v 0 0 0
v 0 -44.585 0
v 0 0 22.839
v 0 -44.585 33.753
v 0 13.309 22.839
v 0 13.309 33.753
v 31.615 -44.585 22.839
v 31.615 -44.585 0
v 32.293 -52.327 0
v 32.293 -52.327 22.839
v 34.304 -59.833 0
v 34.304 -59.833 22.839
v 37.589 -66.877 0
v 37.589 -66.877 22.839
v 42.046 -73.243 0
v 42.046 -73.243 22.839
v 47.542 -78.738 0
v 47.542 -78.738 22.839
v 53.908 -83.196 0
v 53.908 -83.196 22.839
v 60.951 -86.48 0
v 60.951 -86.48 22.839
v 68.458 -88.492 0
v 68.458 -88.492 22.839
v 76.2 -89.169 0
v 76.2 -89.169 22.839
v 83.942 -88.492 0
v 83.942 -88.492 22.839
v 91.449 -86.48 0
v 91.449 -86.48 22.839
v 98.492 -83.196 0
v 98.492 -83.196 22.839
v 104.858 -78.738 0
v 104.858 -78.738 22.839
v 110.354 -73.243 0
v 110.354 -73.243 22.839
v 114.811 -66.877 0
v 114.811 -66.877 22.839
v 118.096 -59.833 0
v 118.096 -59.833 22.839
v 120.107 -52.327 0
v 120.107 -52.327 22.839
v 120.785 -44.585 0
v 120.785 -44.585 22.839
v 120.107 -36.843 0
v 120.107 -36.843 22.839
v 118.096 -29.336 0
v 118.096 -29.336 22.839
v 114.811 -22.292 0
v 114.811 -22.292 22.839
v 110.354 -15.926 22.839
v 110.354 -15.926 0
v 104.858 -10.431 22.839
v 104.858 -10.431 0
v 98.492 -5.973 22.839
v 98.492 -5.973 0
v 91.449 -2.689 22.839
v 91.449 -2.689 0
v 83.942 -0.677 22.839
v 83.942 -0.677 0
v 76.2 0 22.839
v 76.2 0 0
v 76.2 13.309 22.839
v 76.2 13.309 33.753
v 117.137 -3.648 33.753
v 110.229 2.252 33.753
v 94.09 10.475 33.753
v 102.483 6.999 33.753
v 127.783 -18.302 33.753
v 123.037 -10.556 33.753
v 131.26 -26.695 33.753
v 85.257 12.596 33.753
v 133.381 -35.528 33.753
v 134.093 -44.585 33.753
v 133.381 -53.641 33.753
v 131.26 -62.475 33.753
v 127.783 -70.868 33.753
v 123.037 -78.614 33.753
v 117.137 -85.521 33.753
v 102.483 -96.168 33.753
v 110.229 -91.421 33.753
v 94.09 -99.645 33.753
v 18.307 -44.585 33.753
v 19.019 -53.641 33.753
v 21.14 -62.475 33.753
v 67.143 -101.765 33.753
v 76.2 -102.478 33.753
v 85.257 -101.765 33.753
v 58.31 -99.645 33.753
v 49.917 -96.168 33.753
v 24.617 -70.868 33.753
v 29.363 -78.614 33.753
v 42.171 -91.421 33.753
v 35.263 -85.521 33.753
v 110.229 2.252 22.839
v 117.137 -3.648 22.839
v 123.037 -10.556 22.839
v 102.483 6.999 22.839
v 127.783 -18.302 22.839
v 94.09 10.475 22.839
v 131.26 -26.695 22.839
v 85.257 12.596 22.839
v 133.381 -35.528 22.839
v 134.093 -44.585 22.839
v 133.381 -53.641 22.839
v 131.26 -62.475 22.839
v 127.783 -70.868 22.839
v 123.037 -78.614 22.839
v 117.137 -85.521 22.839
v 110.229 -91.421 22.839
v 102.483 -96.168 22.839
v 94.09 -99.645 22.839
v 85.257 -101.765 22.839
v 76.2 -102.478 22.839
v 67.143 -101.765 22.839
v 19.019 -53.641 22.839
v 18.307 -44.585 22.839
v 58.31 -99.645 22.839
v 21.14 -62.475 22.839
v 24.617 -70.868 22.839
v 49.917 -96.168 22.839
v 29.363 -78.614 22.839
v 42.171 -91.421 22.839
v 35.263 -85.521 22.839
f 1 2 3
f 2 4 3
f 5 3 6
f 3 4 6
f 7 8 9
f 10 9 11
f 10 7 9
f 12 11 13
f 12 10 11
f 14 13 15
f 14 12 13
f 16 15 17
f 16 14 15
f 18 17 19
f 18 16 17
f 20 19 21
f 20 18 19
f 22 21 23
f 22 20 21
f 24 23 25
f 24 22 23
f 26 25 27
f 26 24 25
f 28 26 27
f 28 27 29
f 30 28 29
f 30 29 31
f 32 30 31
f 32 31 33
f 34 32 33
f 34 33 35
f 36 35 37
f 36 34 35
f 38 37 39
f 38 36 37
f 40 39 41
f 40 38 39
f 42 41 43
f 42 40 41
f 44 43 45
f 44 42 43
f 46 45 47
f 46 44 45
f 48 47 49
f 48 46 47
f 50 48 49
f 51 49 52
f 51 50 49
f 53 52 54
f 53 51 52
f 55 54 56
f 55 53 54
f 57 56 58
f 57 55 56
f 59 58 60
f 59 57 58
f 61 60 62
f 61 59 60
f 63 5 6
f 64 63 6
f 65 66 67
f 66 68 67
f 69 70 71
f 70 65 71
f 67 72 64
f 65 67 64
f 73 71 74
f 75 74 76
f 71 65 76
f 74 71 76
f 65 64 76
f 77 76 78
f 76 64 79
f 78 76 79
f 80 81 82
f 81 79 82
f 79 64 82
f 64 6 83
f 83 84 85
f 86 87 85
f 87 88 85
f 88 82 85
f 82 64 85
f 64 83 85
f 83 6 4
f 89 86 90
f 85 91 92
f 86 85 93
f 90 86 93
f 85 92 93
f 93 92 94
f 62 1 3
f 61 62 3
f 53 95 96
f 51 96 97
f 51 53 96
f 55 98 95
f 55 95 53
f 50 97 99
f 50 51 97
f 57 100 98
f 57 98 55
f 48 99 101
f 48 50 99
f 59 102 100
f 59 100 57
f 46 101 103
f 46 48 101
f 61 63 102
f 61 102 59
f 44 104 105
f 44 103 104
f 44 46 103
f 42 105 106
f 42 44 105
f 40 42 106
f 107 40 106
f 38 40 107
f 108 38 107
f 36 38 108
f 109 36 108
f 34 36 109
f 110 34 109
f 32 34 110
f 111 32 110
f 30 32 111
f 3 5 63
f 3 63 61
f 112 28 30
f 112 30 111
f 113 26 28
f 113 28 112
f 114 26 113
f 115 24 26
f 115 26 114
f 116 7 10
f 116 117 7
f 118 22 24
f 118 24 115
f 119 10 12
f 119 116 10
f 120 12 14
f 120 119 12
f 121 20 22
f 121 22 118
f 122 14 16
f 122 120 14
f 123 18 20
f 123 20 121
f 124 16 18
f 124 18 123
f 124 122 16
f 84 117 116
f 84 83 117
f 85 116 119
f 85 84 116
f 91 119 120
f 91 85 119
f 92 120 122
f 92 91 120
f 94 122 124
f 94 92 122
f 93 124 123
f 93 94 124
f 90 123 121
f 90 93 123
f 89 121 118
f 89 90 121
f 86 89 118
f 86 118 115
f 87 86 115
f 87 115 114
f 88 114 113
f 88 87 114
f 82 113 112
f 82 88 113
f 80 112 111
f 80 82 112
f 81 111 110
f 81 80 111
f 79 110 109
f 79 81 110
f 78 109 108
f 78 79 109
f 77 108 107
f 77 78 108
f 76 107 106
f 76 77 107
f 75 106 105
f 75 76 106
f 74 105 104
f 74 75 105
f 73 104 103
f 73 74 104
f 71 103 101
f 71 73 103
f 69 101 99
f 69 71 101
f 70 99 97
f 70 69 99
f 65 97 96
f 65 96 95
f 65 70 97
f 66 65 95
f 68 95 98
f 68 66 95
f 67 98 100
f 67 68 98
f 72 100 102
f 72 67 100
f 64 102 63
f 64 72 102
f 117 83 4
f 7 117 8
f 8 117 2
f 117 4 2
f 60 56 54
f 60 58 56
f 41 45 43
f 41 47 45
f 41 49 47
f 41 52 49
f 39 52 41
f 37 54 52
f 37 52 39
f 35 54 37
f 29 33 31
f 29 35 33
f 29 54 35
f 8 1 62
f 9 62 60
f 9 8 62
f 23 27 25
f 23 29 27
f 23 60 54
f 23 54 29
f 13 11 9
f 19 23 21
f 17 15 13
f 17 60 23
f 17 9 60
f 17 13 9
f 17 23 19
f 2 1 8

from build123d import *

# Parameters (mm, degrees)
F1_DEPTH = 76.2


with BuildPart() as f1:
    # F0 (on Right) → F1 (new body)
    with BuildSketch(Plane.YZ):
        Polygon((-44.5846021175, 0), (0, 0), (0, 22.8392984718), (13.3088370785, 22.8392984718), (13.3088370785, 33.7528288364), (-44.5846021175, 33.7528288364), align=None)
    extrude(amount=F1_DEPTH)

    # F1_face (on face) → F2 (revolve)
    with BuildSketch(Plane(origin=(76.2, -19.7443345701, 17.881602017), x_dir=(0, 1, 0), z_dir=(1, 0, 0))):
        Polygon((-24.8402675474, -17.881602017), (19.7443345701, -17.881602017), (19.7443345701, 4.9576964548), (33.0531716486, 4.9576964548), (33.0531716486, 15.8712268194), (-24.8402675474, 15.8712268194), align=None)
    revolve(axis=Axis((76.2, -44.5846021175, 16.8764144182), (0, 0, 1)))


solid = f1.part
